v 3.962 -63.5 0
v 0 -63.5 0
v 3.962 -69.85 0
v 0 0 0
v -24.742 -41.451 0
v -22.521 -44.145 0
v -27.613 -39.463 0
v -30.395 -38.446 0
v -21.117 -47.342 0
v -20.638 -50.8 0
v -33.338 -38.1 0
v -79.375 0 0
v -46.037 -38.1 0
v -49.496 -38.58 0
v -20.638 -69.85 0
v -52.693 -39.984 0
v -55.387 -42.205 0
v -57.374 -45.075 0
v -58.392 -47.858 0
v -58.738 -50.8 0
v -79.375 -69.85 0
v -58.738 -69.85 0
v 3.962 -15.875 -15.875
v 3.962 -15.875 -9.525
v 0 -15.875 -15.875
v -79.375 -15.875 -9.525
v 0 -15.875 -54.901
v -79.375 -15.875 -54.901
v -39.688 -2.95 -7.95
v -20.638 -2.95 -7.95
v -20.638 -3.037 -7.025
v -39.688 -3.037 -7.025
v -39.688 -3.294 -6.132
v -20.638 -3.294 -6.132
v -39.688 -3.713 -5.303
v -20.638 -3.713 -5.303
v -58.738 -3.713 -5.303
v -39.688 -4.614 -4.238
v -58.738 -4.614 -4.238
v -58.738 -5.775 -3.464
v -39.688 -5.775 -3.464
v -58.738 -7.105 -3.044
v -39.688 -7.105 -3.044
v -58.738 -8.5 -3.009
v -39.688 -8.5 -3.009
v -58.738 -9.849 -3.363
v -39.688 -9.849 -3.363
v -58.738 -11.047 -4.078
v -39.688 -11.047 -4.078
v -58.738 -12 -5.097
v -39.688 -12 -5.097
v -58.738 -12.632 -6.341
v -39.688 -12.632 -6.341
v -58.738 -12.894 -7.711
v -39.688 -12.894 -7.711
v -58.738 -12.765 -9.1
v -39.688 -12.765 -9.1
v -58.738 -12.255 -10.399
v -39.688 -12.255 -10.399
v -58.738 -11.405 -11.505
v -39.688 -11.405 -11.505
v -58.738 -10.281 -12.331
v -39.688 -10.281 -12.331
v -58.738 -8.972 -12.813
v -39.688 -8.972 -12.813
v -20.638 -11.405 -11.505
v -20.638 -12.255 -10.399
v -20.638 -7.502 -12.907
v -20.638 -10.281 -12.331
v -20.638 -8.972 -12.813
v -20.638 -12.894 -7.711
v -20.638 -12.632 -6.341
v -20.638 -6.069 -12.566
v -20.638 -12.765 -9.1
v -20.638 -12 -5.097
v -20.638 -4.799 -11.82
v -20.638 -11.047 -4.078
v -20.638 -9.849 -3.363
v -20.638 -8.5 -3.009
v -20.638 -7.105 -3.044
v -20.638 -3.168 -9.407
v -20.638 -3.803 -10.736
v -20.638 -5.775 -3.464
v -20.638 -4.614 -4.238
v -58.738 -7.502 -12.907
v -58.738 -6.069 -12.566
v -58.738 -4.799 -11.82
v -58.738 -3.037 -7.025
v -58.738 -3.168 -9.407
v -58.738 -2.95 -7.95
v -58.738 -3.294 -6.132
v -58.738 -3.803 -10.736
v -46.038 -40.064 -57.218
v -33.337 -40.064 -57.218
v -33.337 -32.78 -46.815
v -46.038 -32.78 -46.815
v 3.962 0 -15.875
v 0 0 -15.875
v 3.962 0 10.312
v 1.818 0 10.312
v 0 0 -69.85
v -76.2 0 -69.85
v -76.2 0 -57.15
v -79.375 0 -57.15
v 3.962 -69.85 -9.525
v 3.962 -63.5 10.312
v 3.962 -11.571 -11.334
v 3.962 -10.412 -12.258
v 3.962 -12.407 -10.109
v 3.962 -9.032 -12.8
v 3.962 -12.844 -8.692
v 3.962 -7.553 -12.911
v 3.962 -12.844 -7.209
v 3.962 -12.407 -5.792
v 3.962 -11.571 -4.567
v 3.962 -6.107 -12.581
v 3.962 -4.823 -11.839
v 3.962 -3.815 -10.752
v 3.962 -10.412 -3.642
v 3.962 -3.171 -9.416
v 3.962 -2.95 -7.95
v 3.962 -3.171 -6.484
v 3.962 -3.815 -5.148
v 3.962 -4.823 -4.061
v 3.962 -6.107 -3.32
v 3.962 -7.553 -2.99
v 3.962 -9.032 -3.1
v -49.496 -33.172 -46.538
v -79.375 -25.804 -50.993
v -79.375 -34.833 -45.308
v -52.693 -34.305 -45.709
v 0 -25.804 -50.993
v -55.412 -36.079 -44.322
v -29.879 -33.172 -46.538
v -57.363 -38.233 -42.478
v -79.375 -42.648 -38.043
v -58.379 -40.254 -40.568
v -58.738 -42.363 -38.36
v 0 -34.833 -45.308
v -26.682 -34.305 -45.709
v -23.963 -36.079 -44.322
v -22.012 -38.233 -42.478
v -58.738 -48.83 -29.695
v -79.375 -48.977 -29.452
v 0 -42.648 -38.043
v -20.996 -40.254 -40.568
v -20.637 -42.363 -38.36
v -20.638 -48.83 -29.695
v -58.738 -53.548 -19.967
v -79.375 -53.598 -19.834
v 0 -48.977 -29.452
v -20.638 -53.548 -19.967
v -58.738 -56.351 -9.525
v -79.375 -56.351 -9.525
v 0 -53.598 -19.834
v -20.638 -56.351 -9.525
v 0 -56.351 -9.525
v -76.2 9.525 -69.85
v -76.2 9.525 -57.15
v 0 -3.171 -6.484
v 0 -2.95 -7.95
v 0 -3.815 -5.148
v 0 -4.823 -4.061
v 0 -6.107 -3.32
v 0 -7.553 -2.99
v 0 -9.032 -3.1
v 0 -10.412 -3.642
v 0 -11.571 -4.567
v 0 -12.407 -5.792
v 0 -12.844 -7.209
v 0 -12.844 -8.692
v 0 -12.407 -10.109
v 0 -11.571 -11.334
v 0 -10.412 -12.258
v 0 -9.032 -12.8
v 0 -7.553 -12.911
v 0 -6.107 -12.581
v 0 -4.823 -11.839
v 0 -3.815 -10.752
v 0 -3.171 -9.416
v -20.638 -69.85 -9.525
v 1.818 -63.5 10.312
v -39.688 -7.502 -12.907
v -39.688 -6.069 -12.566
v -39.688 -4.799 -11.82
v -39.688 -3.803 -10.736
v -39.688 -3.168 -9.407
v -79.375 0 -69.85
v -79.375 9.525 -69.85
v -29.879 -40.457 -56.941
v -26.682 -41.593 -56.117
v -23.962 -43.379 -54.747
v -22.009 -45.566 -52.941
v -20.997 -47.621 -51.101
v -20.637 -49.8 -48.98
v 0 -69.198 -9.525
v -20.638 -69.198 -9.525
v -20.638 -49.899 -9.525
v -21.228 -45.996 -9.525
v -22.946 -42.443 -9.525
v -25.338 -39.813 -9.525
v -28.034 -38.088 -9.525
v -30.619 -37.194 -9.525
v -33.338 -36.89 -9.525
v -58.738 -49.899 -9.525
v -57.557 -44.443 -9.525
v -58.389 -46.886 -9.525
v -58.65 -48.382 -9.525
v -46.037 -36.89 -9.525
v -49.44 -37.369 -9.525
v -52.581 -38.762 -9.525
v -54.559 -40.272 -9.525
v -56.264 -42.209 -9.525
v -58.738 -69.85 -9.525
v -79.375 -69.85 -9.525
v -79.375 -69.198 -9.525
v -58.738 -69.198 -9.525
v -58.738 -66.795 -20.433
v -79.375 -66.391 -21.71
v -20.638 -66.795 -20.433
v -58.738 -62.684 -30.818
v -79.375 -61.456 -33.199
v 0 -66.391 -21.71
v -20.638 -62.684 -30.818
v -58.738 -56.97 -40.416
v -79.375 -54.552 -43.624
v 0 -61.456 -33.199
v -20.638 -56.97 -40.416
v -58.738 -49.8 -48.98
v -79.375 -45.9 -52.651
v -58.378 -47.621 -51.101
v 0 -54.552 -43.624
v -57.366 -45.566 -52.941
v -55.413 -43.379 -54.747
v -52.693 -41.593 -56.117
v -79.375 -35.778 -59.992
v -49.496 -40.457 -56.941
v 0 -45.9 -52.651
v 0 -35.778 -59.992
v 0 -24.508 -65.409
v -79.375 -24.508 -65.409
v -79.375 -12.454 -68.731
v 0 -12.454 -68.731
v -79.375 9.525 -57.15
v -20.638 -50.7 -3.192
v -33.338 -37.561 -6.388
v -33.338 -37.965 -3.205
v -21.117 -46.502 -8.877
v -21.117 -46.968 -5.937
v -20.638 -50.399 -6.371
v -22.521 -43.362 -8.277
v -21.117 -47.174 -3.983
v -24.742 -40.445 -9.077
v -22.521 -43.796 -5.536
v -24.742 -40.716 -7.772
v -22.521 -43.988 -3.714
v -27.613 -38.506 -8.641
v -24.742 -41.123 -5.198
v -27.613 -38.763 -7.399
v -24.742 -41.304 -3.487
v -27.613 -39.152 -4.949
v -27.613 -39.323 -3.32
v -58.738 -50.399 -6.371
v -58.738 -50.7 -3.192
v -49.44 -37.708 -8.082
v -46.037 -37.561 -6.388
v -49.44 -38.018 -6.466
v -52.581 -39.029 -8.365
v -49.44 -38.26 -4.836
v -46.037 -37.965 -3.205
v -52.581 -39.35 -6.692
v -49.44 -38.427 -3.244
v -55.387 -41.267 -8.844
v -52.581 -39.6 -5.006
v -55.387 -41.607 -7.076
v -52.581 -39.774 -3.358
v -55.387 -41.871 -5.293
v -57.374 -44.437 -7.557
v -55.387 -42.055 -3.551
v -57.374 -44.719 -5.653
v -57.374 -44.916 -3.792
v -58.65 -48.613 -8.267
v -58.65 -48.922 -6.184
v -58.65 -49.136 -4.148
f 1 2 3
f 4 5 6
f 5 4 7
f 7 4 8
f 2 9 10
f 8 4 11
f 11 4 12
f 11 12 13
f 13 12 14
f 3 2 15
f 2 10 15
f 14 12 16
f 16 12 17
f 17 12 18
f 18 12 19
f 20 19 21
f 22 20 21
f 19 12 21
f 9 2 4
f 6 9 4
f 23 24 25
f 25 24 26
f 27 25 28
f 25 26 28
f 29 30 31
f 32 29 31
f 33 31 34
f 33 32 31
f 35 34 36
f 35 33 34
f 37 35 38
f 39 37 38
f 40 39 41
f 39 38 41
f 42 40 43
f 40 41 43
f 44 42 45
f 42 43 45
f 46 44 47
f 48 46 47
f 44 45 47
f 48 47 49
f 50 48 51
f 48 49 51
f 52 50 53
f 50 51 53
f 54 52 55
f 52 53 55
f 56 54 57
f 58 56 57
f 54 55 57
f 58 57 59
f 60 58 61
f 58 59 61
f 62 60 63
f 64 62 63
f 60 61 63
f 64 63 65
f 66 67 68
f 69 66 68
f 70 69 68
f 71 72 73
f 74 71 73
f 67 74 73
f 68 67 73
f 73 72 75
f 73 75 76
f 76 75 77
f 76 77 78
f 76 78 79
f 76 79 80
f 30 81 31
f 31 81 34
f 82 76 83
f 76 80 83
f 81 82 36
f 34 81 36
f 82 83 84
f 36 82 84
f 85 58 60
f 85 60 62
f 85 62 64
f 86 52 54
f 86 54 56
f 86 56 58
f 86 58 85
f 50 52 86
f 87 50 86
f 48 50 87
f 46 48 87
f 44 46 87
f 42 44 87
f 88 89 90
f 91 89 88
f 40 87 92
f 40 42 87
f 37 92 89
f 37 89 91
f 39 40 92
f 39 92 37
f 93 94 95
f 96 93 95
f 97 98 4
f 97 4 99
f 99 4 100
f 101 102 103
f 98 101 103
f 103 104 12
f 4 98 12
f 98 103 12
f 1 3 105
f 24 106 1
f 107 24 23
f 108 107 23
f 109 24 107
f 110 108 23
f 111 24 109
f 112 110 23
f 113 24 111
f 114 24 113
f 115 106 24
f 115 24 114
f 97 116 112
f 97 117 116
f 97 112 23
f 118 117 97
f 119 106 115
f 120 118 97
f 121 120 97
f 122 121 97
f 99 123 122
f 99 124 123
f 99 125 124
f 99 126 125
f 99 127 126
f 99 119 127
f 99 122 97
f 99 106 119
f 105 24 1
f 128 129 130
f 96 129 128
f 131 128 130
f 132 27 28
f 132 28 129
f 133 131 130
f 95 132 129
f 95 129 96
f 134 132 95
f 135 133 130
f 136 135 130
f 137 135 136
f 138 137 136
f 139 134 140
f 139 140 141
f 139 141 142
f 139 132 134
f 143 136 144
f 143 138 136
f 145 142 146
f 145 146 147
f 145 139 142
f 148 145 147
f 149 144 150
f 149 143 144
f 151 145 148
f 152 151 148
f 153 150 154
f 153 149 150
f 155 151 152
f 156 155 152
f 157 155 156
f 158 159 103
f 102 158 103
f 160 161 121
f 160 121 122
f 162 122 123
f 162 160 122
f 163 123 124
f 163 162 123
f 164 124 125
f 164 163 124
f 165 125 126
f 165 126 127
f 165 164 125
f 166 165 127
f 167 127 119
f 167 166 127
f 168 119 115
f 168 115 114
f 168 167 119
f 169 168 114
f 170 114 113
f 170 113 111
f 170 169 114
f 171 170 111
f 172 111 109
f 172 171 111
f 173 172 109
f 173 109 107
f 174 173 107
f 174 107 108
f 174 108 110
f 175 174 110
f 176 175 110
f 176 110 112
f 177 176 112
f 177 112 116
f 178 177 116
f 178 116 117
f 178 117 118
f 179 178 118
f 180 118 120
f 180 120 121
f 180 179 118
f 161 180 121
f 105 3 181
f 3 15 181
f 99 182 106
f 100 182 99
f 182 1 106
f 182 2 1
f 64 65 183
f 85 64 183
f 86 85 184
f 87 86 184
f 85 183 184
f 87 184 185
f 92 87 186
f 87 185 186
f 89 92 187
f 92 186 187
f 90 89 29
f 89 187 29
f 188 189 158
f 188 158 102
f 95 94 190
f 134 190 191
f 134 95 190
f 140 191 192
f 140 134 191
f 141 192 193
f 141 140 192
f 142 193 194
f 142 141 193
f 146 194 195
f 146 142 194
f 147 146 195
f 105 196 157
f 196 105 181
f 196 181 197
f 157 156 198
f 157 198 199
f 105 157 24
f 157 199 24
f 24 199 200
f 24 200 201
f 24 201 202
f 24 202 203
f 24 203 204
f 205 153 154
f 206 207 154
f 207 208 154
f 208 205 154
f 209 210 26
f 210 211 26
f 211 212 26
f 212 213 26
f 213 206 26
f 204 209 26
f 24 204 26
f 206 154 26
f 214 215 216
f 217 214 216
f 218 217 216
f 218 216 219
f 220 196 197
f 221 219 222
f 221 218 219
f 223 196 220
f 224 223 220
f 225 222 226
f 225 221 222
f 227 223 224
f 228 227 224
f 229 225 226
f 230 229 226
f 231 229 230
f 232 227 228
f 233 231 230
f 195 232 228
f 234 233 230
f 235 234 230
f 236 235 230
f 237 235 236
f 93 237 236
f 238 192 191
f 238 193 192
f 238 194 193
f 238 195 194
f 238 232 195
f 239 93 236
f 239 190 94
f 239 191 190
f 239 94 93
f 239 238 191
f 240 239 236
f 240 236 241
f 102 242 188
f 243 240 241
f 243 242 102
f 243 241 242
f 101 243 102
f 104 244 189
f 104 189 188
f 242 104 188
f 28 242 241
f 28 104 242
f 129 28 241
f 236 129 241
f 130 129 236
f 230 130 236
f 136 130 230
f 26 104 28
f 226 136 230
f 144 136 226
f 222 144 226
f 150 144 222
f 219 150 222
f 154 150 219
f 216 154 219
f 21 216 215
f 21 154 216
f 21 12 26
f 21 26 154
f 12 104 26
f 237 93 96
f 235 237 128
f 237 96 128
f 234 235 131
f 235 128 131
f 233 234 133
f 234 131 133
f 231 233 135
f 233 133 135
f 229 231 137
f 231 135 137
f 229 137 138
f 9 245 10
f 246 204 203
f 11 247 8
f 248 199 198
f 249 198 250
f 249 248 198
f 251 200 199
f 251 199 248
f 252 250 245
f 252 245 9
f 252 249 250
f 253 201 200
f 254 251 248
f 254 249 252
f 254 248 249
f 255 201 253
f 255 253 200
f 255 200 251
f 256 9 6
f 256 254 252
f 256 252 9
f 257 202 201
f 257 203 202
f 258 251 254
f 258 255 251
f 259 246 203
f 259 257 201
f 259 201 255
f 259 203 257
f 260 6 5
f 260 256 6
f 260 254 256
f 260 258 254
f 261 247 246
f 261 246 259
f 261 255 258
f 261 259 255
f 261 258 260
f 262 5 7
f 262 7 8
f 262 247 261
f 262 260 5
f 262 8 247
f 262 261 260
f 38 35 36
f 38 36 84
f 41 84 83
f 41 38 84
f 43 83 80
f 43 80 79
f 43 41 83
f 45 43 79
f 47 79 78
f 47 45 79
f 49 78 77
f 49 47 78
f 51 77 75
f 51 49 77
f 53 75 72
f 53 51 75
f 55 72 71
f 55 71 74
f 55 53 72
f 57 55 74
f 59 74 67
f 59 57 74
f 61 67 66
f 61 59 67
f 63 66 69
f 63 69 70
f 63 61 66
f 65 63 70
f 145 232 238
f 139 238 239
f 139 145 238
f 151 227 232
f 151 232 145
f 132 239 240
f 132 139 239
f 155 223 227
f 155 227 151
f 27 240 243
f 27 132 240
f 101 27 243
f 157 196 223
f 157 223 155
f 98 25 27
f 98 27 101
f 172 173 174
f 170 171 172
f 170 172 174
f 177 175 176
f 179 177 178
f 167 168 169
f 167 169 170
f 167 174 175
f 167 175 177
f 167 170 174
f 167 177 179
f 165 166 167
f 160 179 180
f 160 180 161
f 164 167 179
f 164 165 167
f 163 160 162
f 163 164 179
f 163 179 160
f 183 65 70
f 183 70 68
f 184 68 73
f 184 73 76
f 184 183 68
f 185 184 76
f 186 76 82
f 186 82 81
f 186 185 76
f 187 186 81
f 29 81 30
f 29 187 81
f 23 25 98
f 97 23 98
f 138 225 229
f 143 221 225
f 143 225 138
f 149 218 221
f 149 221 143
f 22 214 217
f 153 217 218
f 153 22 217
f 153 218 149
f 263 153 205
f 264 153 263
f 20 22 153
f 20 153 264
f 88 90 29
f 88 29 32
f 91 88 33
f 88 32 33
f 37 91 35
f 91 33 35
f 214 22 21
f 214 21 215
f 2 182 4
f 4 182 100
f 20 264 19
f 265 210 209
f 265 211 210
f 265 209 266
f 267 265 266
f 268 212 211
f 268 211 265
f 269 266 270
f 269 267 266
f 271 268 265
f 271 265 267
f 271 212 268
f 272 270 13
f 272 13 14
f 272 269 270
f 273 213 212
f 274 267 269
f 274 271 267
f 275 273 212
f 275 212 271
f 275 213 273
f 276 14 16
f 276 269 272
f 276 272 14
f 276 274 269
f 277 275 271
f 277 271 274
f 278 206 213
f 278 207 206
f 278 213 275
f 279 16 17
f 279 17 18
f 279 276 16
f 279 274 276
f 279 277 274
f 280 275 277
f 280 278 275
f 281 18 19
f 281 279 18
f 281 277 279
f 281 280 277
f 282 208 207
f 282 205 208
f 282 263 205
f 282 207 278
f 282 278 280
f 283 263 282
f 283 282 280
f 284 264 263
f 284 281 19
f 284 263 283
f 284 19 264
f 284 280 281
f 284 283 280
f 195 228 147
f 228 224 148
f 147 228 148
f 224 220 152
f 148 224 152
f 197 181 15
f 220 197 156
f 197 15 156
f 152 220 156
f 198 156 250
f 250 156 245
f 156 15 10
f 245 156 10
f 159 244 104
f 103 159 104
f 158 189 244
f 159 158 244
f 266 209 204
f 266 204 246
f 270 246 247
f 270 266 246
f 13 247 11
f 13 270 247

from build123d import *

# Parameters (mm, degrees)
F1_DEPTH      = 79.375
F4_DEPTH      = 19.05
F4_DEPTH_BACK = 19.05
F5_R          = 12.7
F7_W          = 9.525
F7_H          = 12.7
F8_DEPTH      = 3.175
F6_W          = 63.5
F6_H          = 10.3124
F6_R          = 4.9744809982
F9_DEPTH      = 3.9624
F10_SIZE2     = 1.818344
F10_SIZE      = 10.31239


# Not quite as in the source:
# - a fillet or chamfer is up to 0.001 mm smaller than in the source, because OpenCascade refuses the exact size


with BuildPart() as f1:
    # F0 (on Right) → F1 (new body)
    with BuildSketch(Plane.YZ):
        with BuildLine():
            Line((0, -9.525), (0, 0))
            Line((0, 0), (-57.15, 0))
            ThreePointArc((-57.15, 0), (-56.9498143774, -4.779240775), (-56.350659934, -9.525))
            Line((-56.350659934, -9.525), (-15.875, -9.525))
            Line((-15.875, -9.525), (0, -9.525))
        make_face()
        with BuildLine():
            ThreePointArc((-56.350659934, -9.525), (-56.9498143774, -4.779240775), (-57.15, 0))
            Line((-57.15, 0), (-69.85, 0))
            ThreePointArc((-69.85, 0), (-69.6866892703, -4.7736609169), (-69.1975207287, -9.525))
            Line((-69.1975207287, -9.525), (-56.350659934, -9.525))
        make_face()
        with BuildLine():
            Line((0, -57.15), (0, -9.525))
            Line((0, -9.525), (-15.875, -9.525))
            Line((-15.875, -9.525), (-15.875, -54.9008822789))
            ThreePointArc((-15.875, -54.9008822789), (-8.0167661111, -56.5849269781), (0, -57.15))
        make_face()
        with BuildLine():
            ThreePointArc((-69.1975207287, -9.525), (-69.6866892703, -4.7736609169), (-69.85, 0))
            Line((-69.85, 0), (-69.85, -9.525))
            Line((-69.85, -9.525), (-69.1975207287, -9.525))
        make_face()
        with BuildLine():
            ThreePointArc((-15.875, -54.9008822789), (-42.648319561, -38.042651572), (-56.350659934, -9.525))
            Line((-56.350659934, -9.525), (-69.1975207287, -9.525))
            ThreePointArc((-69.1975207287, -9.525), (-45.900442536, -52.6514185469), (0, -69.85))
            Line((0, -69.85), (0, -57.15))
            ThreePointArc((0, -57.15), (-8.0167661111, -56.5849269781), (-15.875, -54.9008822789))
        make_face()
    extrude(amount=-F1_DEPTH)

    # F3 (on offset) → F4 (cut, two sides)
    with BuildSketch(Plane.YZ.offset(-39.6875)) as f4_sk:
        with BuildLine():
            ThreePointArc((-21.853262225, -31.2096928874), (-33.7951127441, -17.5926221643), (-38.1, 0))
            Line((-38.1, 0), (-69.85, 0))
            Line((-69.85, 0), (-69.85, -9.525))
            Line((-69.85, -9.525), (-69.1975207287, -9.525))
            ThreePointArc((-69.1975207287, -9.525), (-59.6086170026, -36.4120210787), (-40.0643140791, -57.2177702936))
            Line((-40.0643140791, -57.2177702936), (-21.853262225, -31.2096928874))
        make_face()
        with BuildLine():
            ThreePointArc((-2.9503190018, -7.9502), (-3.1448391156, -6.5727258097), (-3.7131865837, -5.3029800181))
            Line((-3.7131865837, -5.3029800181), (-8.9719164583, -12.8132246066))
            ThreePointArc((-8.9719164583, -12.8132246066), (-4.7993720072, -11.8202337289), (-2.9503190018, -7.9502))
        make_face()
        with BuildLine():
            Line((-8.9719164583, -12.8132246066), (-3.7131865837, -5.3029800181))
            ThreePointArc((-3.7131865837, -5.3029800181), (-11.9996562789, -5.0969549164), (-8.9719164583, -12.8132246066))
        make_face()
    extrude(amount=-F4_DEPTH, mode=Mode.SUBTRACT)
    extrude(f4_sk.sketch, amount=F4_DEPTH_BACK, mode=Mode.SUBTRACT)

    # F5
    f5_edges = [f1.edges().sort_by_distance(p)[0] for p in [
        (-58.7375, -37.796331, -4.800764),
        (-58.7375, -36.422104, -52.016155),
        (-20.6375, -37.796331, -4.800764),
        (-20.6375, -36.422104, -52.016155),
    ]]
    fillet(f5_edges, radius=F5_R)

    # F7 (on face) → F8 (join)
    with BuildSketch(Plane(origin=(-79.375, 0, 0), x_dir=(0, -1, 0), z_dir=(-1, 0, 0))):
        with Locations((-4.7625, -63.5)):
            Rectangle(F7_W, F7_H)
    extrude(amount=-F8_DEPTH)

    # F6 (on face) → F9 (join)
    with BuildSketch(Plane.YZ):
        with Locations((-31.75, 5.1562)):
            Rectangle(F6_W, F6_H)
        Polygon((0, -15.875), (0, 0), (-63.5, 0), (-69.85, 0), (-69.85, -9.525), (-69.1975207287, -9.525), (-56.350659934, -9.525), (-15.875, -9.525), (-15.875, -15.875), align=None)
        with Locations((-7.9248, -7.9502)):
            Circle(F6_R, mode=Mode.SUBTRACT)
    extrude(amount=F9_DEPTH)

    # F10 (size 10.3124 and 1.8183543559 in the source; OpenCascade refuses exactly that, so slightly less here)
    f10_edges = [f1.edges().sort_by_distance(p)[0] for p in [
        (0, -31.75, 10.3124),
    ]]
    f10_side = f1.faces().sort_by_distance((0, -31.75, 5.1562))[0]
    chamfer(f10_edges, length=F10_SIZE, length2=F10_SIZE2, reference=f10_side)


solid = f1.part
